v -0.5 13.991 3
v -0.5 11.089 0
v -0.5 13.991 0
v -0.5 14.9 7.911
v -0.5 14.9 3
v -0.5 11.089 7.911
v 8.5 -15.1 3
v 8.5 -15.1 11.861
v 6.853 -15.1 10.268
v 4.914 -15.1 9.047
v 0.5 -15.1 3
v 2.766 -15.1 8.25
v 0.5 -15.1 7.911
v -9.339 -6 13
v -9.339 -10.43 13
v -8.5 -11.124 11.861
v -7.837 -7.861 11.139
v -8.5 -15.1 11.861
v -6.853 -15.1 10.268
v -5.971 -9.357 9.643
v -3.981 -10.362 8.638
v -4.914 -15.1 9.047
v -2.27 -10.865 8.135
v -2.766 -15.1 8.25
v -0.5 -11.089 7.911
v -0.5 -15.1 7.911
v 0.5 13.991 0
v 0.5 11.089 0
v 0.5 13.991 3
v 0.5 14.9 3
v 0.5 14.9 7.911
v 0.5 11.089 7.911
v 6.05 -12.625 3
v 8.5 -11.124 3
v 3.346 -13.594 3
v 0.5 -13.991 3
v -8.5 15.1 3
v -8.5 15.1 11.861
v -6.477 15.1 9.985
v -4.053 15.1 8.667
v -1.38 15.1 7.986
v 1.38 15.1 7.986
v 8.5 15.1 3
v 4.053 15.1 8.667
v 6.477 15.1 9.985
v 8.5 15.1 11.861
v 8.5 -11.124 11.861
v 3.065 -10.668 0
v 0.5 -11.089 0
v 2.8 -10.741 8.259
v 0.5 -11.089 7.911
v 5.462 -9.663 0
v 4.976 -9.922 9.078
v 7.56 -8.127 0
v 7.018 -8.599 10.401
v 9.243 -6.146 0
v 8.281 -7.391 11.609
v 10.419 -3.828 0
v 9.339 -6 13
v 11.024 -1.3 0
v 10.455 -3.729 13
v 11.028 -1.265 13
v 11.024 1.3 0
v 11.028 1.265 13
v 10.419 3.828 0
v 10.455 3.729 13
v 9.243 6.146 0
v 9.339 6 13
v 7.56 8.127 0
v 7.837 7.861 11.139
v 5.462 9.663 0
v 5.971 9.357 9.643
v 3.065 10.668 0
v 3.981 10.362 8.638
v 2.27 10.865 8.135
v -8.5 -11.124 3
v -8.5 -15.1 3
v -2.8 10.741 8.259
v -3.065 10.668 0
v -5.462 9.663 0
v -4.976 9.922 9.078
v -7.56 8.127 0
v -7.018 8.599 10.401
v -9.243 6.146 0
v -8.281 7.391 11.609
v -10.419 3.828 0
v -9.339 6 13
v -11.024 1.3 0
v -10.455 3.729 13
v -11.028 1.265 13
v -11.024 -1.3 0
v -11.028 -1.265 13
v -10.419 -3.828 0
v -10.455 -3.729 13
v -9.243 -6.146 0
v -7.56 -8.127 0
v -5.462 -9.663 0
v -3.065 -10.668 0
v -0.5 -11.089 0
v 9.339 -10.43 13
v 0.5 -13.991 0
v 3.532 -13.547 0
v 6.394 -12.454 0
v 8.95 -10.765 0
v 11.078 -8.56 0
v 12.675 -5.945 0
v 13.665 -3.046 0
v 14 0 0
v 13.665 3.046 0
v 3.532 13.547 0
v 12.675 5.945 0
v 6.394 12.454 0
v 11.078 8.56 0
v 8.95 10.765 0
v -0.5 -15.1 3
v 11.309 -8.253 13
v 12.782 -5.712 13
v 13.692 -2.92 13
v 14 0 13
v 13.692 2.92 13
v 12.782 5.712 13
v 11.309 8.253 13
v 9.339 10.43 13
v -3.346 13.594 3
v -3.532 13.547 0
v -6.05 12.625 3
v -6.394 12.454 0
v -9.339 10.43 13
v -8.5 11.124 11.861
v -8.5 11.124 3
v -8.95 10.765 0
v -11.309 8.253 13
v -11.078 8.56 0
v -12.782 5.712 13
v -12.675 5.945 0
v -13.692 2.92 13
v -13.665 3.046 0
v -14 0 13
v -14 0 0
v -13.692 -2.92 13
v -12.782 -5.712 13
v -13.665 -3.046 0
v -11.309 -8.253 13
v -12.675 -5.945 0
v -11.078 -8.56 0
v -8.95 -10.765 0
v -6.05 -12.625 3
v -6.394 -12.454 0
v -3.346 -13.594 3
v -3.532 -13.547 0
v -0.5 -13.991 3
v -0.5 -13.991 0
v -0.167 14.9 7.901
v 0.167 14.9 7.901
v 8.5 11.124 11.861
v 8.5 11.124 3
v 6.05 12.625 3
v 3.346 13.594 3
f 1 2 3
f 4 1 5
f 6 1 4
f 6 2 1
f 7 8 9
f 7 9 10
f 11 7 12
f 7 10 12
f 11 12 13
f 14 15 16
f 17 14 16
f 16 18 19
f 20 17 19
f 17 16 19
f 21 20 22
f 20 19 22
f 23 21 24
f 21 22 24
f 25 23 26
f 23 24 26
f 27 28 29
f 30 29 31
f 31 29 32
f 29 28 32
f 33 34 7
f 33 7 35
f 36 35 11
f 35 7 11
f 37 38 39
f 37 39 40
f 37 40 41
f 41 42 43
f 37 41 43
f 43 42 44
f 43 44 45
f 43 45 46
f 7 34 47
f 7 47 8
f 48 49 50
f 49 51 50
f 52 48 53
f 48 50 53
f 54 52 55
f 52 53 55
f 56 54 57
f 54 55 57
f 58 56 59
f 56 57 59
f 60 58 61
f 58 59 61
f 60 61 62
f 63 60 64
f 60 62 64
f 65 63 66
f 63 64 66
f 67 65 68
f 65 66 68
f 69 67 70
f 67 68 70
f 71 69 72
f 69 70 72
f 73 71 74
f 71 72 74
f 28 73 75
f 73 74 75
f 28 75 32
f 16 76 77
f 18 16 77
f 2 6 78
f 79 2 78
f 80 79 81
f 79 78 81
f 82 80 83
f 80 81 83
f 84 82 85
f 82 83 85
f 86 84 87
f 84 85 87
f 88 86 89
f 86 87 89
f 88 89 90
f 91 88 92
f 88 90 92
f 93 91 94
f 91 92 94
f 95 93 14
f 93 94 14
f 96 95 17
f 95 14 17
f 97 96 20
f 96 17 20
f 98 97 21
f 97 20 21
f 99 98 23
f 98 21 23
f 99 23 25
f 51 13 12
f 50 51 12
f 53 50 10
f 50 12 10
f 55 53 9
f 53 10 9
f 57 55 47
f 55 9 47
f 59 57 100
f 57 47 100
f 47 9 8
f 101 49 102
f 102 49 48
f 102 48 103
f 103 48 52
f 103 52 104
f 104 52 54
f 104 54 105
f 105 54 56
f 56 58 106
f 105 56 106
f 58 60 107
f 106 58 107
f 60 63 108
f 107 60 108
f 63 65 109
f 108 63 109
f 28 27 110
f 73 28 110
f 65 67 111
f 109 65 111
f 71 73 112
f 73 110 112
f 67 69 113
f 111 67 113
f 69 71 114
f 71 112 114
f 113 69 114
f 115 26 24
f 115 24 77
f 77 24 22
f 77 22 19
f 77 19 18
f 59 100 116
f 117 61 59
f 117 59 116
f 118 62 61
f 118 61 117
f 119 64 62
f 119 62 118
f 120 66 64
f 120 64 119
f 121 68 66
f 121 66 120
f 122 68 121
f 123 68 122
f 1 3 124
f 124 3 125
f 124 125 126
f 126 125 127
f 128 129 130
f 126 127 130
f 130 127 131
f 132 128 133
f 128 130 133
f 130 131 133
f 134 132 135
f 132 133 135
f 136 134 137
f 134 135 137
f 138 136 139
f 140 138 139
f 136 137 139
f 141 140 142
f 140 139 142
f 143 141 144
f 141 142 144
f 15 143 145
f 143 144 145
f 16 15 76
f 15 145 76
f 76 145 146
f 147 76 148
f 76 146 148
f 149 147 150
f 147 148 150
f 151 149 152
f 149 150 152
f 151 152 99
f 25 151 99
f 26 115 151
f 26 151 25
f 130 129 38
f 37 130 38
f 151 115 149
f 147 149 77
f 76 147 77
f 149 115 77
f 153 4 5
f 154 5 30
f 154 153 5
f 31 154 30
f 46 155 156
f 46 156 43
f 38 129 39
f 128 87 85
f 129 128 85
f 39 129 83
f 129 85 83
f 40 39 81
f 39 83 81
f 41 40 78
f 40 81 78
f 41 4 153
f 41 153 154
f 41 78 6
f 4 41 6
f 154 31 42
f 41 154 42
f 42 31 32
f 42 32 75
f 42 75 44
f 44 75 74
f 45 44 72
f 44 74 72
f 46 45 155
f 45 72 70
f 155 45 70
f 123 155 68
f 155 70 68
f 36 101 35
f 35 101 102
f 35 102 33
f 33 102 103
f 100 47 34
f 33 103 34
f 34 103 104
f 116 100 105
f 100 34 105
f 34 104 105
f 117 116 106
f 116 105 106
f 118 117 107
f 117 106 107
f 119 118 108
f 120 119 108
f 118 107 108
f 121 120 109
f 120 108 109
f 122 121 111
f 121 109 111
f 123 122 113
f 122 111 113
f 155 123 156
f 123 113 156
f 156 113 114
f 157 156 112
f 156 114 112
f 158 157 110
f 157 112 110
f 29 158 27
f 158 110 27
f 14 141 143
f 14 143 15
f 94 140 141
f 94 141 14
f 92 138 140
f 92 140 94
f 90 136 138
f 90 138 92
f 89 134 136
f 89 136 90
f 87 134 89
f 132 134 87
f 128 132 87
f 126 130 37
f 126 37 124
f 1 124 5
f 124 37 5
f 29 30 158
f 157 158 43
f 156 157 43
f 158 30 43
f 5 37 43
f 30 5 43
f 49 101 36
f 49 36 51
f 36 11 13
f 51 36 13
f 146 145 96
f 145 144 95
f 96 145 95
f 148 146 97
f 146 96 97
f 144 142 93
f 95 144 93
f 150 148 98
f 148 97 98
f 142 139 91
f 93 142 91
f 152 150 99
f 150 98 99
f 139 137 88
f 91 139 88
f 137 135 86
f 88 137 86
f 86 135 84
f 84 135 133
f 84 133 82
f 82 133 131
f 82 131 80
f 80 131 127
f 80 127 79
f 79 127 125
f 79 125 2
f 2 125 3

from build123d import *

# Parameters (mm, degrees)
SKETCH_R           = 14
PAD_DEPTH          = 13
SKETCH001_R        = 11.1
POCKET_DEPTH       = 13.001
SKETCH002_W        = 17
SKETCH002_H        = 4
PAD001_DEPTH       = 10
POLARPATTERN_COUNT = 2
SKETCH005_R        = 11.1
POCKET003_DEPTH    = 30.201
SKETCH006_W        = 1
SKETCH006_H        = 9.58917
POCKET004_DEPTH    = 30


with BuildPart() as part:
    # Sketch → Pad (new body)
    with BuildSketch(Plane.XY):
        Circle(SKETCH_R)
    extrude(amount=PAD_DEPTH)

    # Sketch001 → Pocket (cut, through all)
    with BuildSketch(Plane.XY.offset(13)):
        Circle(SKETCH001_R)
    extrude(amount=-POCKET_DEPTH, mode=Mode.SUBTRACT)

    # Sketch002 → Pad001 (new body)
    with BuildSketch(Plane.XY.offset(13)):
        with Locations((0, 13.1)):
            Rectangle(SKETCH002_W, SKETCH002_H)
    pad001 = extrude(amount=-PAD001_DEPTH)

    # PolarPattern: Pad001 ×2 about axis
    polarpattern_axis = Axis((0, 0, 13), (0, 0, 1))
    for i in range(1, POLARPATTERN_COUNT):
        add(pad001.rotate(polarpattern_axis, i * 360 / POLARPATTERN_COUNT))

    # Sketch005 → Pocket003 (cut, through all)
    with BuildSketch(Plane.XZ.offset(15.1)):
        with Locations((0, 19)):
            Circle(SKETCH005_R)
    extrude(amount=-POCKET003_DEPTH, mode=Mode.SUBTRACT)

    # Sketch006 → Pocket004 (cut)
    with BuildSketch(Plane.XZ.offset(15.1)):
        with Locations((0, 4.794585)):
            Rectangle(SKETCH006_W, SKETCH006_H)
    extrude(amount=-POCKET004_DEPTH, mode=Mode.SUBTRACT)


solid = part.part
